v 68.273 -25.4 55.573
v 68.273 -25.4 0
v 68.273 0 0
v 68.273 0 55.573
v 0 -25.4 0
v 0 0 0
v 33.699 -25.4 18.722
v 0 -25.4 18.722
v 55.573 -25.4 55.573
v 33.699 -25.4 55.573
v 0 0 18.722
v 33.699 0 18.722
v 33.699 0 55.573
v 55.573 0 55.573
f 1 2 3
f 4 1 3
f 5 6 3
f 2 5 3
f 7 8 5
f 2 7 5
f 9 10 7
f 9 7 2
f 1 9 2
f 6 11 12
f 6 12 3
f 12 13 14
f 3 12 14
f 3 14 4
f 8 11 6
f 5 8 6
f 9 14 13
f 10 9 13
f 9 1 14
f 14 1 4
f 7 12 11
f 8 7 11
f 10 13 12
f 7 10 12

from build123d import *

# Parameters (mm, degrees)
F1_DEPTH  = 25.4
F1_FACE_W = 25.4
F1_FACE_H = 55.573448
F2_DEPTH  = 12.7


with BuildPart() as f1:
    # F0 (on Front) → F1 (new body)
    with BuildSketch(Plane.XZ):
        Polygon((0, 18.721553), (0, 0), (55.573452, 0), (55.573452, 55.573449), (33.698794, 55.573449), (33.698794, 18.721553), align=None)
    extrude(amount=F1_DEPTH)

    # F1_face (on face) → F2 (join, symmetric)
    with BuildSketch(Plane(origin=(55.573452, -12.7, 27.786724), x_dir=(0, 1, 0), z_dir=(1, 0, 0))):
        Rectangle(F1_FACE_W, F1_FACE_H)
    extrude(amount=F2_DEPTH, both=True)


solid = f1.part
